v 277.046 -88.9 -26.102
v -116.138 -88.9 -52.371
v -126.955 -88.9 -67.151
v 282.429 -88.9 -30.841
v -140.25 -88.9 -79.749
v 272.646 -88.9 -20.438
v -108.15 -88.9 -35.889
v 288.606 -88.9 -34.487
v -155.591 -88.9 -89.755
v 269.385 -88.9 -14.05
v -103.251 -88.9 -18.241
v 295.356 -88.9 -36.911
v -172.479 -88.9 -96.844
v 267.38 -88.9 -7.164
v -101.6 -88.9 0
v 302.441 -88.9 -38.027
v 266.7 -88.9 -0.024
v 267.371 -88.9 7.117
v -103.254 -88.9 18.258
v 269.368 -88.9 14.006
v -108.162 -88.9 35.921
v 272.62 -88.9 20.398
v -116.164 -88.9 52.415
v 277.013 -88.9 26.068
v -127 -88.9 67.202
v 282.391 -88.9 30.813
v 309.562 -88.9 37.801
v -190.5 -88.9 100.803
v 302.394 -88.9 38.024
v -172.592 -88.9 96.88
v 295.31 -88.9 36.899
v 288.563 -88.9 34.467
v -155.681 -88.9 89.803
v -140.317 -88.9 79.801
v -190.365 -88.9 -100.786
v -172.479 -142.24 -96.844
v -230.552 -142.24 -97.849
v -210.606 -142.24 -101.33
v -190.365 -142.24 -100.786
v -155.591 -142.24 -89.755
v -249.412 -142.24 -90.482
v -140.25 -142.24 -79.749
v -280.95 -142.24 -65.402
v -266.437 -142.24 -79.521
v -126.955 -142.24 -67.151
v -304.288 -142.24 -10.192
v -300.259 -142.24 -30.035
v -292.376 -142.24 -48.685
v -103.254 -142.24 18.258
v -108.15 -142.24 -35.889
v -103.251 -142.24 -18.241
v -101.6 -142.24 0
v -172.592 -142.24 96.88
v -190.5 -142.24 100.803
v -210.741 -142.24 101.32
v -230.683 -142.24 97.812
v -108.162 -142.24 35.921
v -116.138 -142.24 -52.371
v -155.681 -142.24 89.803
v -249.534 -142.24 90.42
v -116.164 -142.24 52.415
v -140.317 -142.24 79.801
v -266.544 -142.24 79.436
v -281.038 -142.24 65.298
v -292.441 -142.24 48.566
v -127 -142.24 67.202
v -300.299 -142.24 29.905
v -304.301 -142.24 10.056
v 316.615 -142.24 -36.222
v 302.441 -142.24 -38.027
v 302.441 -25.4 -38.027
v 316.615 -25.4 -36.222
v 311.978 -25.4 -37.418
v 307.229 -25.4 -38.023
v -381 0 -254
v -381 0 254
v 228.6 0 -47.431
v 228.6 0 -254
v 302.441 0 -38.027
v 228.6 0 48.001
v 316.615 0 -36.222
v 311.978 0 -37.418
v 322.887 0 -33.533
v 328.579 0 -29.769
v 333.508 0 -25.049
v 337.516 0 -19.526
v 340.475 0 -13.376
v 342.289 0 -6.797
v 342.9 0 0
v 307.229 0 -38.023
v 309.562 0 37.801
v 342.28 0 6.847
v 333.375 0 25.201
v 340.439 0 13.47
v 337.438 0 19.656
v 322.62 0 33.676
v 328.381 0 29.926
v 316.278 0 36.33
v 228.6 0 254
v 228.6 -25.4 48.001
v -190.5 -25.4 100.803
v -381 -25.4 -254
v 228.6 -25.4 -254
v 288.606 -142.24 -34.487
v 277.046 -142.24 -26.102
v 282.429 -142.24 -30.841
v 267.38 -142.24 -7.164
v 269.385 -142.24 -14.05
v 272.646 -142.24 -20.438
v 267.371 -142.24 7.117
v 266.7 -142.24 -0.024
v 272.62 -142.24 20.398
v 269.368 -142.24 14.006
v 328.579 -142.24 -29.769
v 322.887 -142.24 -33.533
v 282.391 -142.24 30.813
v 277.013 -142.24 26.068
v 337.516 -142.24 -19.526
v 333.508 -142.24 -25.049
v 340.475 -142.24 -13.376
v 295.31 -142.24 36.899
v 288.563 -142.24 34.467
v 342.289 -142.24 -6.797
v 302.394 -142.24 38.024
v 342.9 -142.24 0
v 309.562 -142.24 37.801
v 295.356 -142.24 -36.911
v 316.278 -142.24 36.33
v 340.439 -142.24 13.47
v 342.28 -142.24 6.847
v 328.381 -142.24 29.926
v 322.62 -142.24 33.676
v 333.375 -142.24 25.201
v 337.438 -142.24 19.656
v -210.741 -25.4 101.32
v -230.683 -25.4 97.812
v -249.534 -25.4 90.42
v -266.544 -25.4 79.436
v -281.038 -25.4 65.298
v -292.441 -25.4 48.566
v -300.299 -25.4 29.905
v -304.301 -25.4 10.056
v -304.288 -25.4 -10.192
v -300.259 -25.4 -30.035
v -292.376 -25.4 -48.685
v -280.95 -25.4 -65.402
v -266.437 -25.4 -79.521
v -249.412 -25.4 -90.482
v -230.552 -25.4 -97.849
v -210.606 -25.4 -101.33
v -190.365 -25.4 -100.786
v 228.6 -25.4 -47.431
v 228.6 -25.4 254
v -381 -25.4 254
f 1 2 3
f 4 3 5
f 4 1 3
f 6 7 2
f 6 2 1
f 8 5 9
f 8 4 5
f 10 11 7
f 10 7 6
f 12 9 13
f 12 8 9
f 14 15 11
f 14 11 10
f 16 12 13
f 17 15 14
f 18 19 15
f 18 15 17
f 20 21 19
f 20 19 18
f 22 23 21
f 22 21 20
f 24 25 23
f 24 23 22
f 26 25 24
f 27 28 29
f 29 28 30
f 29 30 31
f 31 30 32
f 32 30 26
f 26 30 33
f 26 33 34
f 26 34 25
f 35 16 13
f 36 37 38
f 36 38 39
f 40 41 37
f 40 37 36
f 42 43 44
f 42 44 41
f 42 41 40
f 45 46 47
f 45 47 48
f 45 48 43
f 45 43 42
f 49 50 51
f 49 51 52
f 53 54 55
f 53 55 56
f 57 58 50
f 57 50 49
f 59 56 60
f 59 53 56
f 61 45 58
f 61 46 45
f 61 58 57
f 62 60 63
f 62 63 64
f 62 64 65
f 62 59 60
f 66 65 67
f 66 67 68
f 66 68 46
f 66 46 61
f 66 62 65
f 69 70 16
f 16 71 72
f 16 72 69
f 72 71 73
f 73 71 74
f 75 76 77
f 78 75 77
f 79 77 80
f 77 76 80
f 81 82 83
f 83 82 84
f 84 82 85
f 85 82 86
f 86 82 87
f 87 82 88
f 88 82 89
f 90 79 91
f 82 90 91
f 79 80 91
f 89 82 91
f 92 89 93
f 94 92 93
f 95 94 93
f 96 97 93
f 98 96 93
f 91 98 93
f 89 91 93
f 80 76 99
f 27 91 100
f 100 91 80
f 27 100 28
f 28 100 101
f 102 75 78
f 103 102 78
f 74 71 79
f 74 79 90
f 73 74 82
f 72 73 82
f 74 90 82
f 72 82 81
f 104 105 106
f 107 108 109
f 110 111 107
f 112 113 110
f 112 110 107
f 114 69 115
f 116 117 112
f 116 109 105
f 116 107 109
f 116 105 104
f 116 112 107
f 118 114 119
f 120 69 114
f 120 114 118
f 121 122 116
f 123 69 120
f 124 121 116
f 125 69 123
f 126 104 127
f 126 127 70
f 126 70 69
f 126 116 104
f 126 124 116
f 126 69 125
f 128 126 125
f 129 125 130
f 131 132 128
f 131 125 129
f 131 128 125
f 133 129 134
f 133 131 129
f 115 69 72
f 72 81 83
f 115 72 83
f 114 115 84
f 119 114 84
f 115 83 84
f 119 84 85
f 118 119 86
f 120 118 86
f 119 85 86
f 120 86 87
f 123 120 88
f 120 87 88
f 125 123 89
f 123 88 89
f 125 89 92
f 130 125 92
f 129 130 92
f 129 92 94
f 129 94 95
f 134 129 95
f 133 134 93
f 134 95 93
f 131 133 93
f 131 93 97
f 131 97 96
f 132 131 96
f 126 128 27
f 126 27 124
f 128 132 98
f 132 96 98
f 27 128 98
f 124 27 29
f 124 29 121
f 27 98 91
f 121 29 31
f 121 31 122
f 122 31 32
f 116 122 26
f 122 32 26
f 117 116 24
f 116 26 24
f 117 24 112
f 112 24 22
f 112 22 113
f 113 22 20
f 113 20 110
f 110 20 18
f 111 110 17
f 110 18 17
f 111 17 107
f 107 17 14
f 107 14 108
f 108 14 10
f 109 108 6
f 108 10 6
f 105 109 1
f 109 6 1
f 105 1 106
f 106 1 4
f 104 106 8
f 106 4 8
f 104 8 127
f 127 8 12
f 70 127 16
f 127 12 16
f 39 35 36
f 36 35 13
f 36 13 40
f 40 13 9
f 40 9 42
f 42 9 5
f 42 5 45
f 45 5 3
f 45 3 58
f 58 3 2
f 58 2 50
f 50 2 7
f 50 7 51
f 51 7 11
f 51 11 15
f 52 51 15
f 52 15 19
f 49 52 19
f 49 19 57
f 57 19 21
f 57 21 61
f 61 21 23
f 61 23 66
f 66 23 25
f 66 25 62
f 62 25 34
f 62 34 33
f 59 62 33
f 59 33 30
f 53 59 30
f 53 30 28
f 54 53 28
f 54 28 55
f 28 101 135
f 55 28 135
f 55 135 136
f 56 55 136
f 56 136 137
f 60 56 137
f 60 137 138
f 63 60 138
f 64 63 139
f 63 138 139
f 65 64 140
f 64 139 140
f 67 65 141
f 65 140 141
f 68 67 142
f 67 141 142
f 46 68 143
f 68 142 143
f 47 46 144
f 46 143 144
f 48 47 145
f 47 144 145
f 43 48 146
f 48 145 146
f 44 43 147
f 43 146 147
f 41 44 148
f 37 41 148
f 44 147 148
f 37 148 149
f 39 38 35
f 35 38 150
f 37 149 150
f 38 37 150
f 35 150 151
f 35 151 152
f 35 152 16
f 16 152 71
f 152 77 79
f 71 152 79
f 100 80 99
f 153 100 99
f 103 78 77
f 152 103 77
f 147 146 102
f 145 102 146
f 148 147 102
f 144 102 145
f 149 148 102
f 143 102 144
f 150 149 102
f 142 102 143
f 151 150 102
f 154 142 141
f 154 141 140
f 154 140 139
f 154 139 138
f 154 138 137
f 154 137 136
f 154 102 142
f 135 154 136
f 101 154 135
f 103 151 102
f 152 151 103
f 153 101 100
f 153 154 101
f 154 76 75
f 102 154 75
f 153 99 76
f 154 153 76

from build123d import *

# Parameters (mm, degrees)
F1_DEPTH = 25.4
F2_DEPTH = 88.9
F3_DEPTH = 142.24


with BuildPart() as f1:
    # F0 (on Front) → F1 (new body)
    with BuildSketch(Plane.XZ):
        with BuildLine():
            Line((228.6, 254), (-381, 254))
            Line((-381, 254), (-381, -254))
            Line((-381, -254), (228.6, -254))
            Line((228.6, -254), (228.6, -47.4305862601))
            Line((228.6, -47.4305862601), (-190.3648431942, -100.7860047317))
            ThreePointArc((-190.3648431942, -100.7860047317), (-304.7999771648, -0.0681183971), (-190.5, 100.8031249516))
            Line((-190.5, 100.8031249516), (228.6, 48.0014880722))
            Line((228.6, 48.0014880722), (228.6, 254))
        make_face()
        with BuildLine():
            Line((309.5625, 37.8011718568), (228.6, 48.0014880722))
            Line((228.6, 48.0014880722), (228.6, -47.4305862601))
            Line((228.6, -47.4305862601), (302.4409560086, -38.0268972104))
            ThreePointArc((302.4409560086, -38.0268972104), (266.8669251864, 3.5625602015), (309.5625, 37.8011718568))
        make_face()
        with BuildLine():
            Line((228.6, -47.4305862601), (228.6, 48.0014880722))
            Line((228.6, 48.0014880722), (-190.5, 100.8031249516))
            ThreePointArc((-190.5, 100.8031249516), (-127, 67.202083301), (-101.6, 0))
            ThreePointArc((-101.6, 0), (-126.9549610418, -67.1509793991), (-190.3648431942, -100.7860047317))
            Line((-190.3648431942, -100.7860047317), (228.6, -47.4305862601))
        make_face()
        with BuildLine():
            ThreePointArc((342.9, 0), (333.375, 25.2007812379), (309.5625, 37.8011718568))
            ThreePointArc((309.5625, 37.8011718568), (266.8669251864, 3.5625602015), (302.4409560086, -38.0268972104))
            Line((302.4409560086, -38.0268972104), (316.6146676198, -36.2218667249))
            ThreePointArc((316.6146676198, -36.2218667249), (335.6362516879, -22.37712184), (342.9, 0))
        make_face()
        with BuildLine():
            Line((316.6146676198, -36.2218667249), (302.4409560086, -38.0268972104))
            ThreePointArc((302.4409560086, -38.0268972104), (309.6131838022, -37.7947517744), (316.6146676198, -36.2218667249))
        make_face()
        with BuildLine():
            ThreePointArc((-101.6, 0), (-127, 67.202083301), (-190.5, 100.8031249516))
            ThreePointArc((-190.5, 100.8031249516), (-304.7999771648, -0.0681183971), (-190.3648431942, -100.7860047317))
            ThreePointArc((-190.3648431942, -100.7860047317), (-126.9549610418, -67.1509793991), (-101.6, 0))
        make_face()
        with BuildLine():
            Line((228.6, -47.4305862601), (228.6, 48.0014880722))
            Line((228.6, 48.0014880722), (-190.5, 100.8031249516))
            ThreePointArc((-190.5, 100.8031249516), (-127, 67.202083301), (-101.6, 0))
            ThreePointArc((-101.6, 0), (-126.9549610418, -67.1509793991), (-190.3648431942, -100.7860047317))
            Line((-190.3648431942, -100.7860047317), (228.6, -47.4305862601))
        make_face()
        with BuildLine():
            Line((309.5625, 37.8011718568), (228.6, 48.0014880722))
            Line((228.6, 48.0014880722), (228.6, -47.4305862601))
            Line((228.6, -47.4305862601), (302.4409560086, -38.0268972104))
            ThreePointArc((302.4409560086, -38.0268972104), (266.8669251864, 3.5625602015), (309.5625, 37.8011718568))
        make_face()
        with BuildLine():
            ThreePointArc((342.9, 0), (333.375, 25.2007812379), (309.5625, 37.8011718568))
            ThreePointArc((309.5625, 37.8011718568), (266.8669251864, 3.5625602015), (302.4409560086, -38.0268972104))
            Line((302.4409560086, -38.0268972104), (316.6146676198, -36.2218667249))
            ThreePointArc((316.6146676198, -36.2218667249), (335.6362516879, -22.37712184), (342.9, 0))
        make_face()
    extrude(amount=F1_DEPTH)

    # F0 (on Front) → F2 (join)
    with BuildSketch(Plane.XZ):
        with BuildLine():
            ThreePointArc((342.9, 0), (333.375, 25.2007812379), (309.5625, 37.8011718568))
            ThreePointArc((309.5625, 37.8011718568), (266.8669251864, 3.5625602015), (302.4409560086, -38.0268972104))
            Line((302.4409560086, -38.0268972104), (316.6146676198, -36.2218667249))
            ThreePointArc((316.6146676198, -36.2218667249), (335.6362516879, -22.37712184), (342.9, 0))
        make_face()
        with BuildLine():
            ThreePointArc((-101.6, 0), (-127, 67.202083301), (-190.5, 100.8031249516))
            ThreePointArc((-190.5, 100.8031249516), (-304.7999771648, -0.0681183971), (-190.3648431942, -100.7860047317))
            ThreePointArc((-190.3648431942, -100.7860047317), (-126.9549610418, -67.1509793991), (-101.6, 0))
        make_face()
        with BuildLine():
            Line((228.6, -47.4305862601), (228.6, 48.0014880722))
            Line((228.6, 48.0014880722), (-190.5, 100.8031249516))
            ThreePointArc((-190.5, 100.8031249516), (-127, 67.202083301), (-101.6, 0))
            ThreePointArc((-101.6, 0), (-126.9549610418, -67.1509793991), (-190.3648431942, -100.7860047317))
            Line((-190.3648431942, -100.7860047317), (228.6, -47.4305862601))
        make_face()
        with BuildLine():
            Line((309.5625, 37.8011718568), (228.6, 48.0014880722))
            Line((228.6, 48.0014880722), (228.6, -47.4305862601))
            Line((228.6, -47.4305862601), (302.4409560086, -38.0268972104))
            ThreePointArc((302.4409560086, -38.0268972104), (266.8669251864, 3.5625602015), (309.5625, 37.8011718568))
        make_face()
    extrude(amount=F2_DEPTH)

    # F0 (on Front) → F3 (join)
    with BuildSketch(Plane.XZ):
        with BuildLine():
            ThreePointArc((342.9, 0), (333.375, 25.2007812379), (309.5625, 37.8011718568))
            ThreePointArc((309.5625, 37.8011718568), (266.8669251864, 3.5625602015), (302.4409560086, -38.0268972104))
            Line((302.4409560086, -38.0268972104), (316.6146676198, -36.2218667249))
            ThreePointArc((316.6146676198, -36.2218667249), (335.6362516879, -22.37712184), (342.9, 0))
        make_face()
        with BuildLine():
            ThreePointArc((-101.6, 0), (-127, 67.202083301), (-190.5, 100.8031249516))
            ThreePointArc((-190.5, 100.8031249516), (-304.7999771648, -0.0681183971), (-190.3648431942, -100.7860047317))
            ThreePointArc((-190.3648431942, -100.7860047317), (-126.9549610418, -67.1509793991), (-101.6, 0))
        make_face()
    extrude(amount=F3_DEPTH)


solid = f1.part
